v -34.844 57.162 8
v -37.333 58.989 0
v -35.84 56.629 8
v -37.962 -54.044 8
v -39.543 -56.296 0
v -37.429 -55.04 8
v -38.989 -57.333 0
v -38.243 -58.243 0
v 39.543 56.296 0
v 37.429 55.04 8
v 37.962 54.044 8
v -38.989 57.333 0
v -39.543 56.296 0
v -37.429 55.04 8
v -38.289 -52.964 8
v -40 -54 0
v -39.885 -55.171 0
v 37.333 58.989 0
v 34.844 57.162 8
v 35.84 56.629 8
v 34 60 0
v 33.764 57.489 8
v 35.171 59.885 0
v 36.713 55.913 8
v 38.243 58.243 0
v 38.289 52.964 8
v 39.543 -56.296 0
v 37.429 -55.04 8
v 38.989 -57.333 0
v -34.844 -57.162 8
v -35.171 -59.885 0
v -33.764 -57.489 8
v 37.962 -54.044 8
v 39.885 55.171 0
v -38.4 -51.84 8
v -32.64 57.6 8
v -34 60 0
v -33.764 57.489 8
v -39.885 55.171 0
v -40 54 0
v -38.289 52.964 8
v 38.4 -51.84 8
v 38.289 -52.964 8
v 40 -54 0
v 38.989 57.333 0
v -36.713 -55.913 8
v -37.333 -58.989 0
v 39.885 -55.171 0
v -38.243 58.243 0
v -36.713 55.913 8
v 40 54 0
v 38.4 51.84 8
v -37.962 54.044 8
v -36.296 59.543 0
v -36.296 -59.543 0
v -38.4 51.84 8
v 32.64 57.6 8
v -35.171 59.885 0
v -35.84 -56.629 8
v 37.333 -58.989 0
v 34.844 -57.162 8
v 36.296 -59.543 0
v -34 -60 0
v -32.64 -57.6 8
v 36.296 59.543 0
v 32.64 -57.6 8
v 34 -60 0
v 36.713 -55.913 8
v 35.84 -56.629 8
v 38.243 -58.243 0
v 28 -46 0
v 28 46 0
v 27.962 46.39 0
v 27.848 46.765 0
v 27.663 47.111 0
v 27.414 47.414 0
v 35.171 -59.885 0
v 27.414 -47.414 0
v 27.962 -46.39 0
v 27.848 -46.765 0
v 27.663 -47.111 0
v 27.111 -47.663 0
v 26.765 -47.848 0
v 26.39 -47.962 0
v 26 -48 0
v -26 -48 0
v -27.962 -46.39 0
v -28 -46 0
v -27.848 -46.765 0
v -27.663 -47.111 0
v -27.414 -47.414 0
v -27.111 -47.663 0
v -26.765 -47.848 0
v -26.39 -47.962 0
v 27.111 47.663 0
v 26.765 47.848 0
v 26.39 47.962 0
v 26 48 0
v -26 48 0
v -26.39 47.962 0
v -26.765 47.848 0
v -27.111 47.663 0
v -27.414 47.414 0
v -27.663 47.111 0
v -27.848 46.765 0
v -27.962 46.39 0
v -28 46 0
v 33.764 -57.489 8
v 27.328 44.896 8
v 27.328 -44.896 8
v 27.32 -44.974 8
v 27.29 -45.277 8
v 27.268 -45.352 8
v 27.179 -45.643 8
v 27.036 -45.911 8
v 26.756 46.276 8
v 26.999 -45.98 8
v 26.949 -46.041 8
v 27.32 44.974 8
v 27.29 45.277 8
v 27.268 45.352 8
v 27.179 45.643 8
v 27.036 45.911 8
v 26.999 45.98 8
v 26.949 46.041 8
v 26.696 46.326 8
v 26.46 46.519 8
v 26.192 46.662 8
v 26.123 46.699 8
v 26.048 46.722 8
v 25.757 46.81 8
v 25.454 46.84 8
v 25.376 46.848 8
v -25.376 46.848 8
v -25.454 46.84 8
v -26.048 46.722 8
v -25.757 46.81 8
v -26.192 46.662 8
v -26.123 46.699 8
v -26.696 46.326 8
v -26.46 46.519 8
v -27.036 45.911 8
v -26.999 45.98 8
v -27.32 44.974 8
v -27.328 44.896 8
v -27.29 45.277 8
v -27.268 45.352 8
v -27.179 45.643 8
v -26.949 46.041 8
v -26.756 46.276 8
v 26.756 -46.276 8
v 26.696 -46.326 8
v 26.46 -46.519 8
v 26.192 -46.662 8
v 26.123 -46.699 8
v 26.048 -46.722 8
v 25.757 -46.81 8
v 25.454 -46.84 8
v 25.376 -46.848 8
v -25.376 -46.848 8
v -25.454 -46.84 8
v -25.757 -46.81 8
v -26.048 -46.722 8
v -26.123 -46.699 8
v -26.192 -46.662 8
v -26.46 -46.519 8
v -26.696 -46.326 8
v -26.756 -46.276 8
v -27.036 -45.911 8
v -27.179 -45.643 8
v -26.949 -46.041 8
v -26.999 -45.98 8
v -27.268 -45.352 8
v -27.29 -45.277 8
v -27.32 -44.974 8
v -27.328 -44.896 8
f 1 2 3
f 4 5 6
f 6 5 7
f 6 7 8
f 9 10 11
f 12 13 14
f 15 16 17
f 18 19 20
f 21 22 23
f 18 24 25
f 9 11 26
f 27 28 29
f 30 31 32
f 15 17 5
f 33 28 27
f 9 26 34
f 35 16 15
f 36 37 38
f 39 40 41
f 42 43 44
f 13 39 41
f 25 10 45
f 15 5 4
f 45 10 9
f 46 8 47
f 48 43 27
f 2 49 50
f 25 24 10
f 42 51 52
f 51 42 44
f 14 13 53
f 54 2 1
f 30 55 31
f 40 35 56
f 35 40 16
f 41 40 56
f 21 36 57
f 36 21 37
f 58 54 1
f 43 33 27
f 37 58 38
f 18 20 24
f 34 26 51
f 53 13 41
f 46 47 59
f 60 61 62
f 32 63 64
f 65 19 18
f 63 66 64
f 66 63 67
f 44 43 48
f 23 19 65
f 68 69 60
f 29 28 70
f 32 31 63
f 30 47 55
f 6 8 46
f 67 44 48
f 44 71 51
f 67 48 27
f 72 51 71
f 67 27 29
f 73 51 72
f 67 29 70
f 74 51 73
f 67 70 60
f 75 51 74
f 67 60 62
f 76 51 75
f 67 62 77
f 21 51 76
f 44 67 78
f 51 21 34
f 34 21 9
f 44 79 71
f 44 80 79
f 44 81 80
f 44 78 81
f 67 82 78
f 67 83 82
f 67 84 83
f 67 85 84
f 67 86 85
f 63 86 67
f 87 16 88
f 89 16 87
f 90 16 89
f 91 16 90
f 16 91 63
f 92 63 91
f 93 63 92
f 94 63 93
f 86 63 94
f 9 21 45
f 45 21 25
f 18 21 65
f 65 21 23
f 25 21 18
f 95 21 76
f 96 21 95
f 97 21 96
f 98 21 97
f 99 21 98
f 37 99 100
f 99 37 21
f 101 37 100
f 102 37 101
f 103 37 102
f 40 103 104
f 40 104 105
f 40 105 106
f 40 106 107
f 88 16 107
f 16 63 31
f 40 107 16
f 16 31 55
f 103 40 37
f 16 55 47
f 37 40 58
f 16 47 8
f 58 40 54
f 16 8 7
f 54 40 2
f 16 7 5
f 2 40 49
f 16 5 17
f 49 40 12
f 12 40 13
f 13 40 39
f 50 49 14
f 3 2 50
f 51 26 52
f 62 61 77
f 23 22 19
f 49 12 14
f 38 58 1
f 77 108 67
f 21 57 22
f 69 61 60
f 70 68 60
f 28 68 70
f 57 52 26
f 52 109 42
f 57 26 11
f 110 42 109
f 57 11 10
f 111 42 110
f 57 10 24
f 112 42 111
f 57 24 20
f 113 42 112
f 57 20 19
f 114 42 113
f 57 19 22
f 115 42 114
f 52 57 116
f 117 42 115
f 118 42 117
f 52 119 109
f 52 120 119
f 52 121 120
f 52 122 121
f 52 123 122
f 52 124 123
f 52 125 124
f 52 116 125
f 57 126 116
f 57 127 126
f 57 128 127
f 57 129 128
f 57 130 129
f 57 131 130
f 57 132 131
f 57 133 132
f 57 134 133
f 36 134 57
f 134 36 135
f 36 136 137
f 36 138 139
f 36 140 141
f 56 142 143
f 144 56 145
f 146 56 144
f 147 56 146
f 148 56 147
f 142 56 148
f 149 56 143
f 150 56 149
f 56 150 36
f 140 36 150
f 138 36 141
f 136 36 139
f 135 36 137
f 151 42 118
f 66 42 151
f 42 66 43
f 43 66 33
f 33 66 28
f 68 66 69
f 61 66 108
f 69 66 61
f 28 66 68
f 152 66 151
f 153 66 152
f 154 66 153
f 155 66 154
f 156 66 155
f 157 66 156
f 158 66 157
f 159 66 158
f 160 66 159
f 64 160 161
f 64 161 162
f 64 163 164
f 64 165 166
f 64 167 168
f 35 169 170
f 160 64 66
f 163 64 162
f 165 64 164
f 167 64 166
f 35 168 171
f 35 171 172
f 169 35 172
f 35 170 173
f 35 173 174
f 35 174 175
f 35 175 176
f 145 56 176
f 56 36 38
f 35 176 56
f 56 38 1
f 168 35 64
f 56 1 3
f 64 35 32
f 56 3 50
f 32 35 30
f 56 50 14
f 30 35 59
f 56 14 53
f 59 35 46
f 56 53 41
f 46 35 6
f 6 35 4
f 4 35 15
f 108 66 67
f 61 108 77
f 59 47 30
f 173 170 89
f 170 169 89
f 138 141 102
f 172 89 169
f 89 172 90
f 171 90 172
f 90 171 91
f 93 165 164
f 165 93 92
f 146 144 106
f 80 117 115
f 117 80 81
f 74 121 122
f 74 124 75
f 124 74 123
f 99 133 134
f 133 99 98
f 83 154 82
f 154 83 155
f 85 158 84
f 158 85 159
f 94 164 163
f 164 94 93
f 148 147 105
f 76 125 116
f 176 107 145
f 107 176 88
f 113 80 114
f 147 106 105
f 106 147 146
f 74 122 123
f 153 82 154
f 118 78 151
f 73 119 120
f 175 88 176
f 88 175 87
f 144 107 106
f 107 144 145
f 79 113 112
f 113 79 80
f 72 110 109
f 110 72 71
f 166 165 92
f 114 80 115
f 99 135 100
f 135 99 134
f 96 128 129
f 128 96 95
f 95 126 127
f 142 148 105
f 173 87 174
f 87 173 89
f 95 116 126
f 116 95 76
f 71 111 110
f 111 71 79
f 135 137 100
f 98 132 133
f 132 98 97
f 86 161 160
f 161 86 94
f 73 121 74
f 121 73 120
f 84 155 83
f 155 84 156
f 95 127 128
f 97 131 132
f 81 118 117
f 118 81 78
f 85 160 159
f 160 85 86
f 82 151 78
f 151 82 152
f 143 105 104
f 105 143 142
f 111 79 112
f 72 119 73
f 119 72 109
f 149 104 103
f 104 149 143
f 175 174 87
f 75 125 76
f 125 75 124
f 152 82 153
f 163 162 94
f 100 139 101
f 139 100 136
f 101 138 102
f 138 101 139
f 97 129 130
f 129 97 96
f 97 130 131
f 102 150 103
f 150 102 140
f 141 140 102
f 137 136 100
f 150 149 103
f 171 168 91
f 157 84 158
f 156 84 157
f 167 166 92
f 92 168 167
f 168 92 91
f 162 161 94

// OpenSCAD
$fn = 32;

// ----------------------------------------------------------------------
// Display bezel: 80 x 120 mm frame, opening 56x96 mm
// ----------------------------------------------------------------------

// --- parameters (mm) ---
length = 80;              // frame outside length, X
width = 120;              // frame outside width, Y
frame_w = 12;             // frame width
thickness = 8;            // frame thickness
corner_r = 6;             // outside corner radius
chamfer = 0.96;           // outer wall taper
funnel = 0.97;            // inner opening taper
opening_l = 56;           // opening length
opening_w = 96;           // opening width
inner_r = 2;              // opening corner radius

/* rounded-rectangle outlines, generated with loops */
module rounded_ring(l_nom, w_nom, r) {
  hull() {
    for (sx = [-1, 1]) for (sy = [-1, 1])
      translate([sx * (l_nom / 2 - r), sy * (w_nom / 2 - r)]) circle(r = r);
  }
}

difference() {
  /* frame body, drafted so the outer edge is a variable-depth chamfer */
  linear_extrude(height = thickness, scale = chamfer)
    rounded_ring(length, width, corner_r);
  /* viewing opening, drafted the other way for a funnel edge */
  linear_extrude(height = thickness + 2, scale = funnel)
    translate([0, 0, -1]) rounded_ring(opening_l, opening_w, inner_r);
}
